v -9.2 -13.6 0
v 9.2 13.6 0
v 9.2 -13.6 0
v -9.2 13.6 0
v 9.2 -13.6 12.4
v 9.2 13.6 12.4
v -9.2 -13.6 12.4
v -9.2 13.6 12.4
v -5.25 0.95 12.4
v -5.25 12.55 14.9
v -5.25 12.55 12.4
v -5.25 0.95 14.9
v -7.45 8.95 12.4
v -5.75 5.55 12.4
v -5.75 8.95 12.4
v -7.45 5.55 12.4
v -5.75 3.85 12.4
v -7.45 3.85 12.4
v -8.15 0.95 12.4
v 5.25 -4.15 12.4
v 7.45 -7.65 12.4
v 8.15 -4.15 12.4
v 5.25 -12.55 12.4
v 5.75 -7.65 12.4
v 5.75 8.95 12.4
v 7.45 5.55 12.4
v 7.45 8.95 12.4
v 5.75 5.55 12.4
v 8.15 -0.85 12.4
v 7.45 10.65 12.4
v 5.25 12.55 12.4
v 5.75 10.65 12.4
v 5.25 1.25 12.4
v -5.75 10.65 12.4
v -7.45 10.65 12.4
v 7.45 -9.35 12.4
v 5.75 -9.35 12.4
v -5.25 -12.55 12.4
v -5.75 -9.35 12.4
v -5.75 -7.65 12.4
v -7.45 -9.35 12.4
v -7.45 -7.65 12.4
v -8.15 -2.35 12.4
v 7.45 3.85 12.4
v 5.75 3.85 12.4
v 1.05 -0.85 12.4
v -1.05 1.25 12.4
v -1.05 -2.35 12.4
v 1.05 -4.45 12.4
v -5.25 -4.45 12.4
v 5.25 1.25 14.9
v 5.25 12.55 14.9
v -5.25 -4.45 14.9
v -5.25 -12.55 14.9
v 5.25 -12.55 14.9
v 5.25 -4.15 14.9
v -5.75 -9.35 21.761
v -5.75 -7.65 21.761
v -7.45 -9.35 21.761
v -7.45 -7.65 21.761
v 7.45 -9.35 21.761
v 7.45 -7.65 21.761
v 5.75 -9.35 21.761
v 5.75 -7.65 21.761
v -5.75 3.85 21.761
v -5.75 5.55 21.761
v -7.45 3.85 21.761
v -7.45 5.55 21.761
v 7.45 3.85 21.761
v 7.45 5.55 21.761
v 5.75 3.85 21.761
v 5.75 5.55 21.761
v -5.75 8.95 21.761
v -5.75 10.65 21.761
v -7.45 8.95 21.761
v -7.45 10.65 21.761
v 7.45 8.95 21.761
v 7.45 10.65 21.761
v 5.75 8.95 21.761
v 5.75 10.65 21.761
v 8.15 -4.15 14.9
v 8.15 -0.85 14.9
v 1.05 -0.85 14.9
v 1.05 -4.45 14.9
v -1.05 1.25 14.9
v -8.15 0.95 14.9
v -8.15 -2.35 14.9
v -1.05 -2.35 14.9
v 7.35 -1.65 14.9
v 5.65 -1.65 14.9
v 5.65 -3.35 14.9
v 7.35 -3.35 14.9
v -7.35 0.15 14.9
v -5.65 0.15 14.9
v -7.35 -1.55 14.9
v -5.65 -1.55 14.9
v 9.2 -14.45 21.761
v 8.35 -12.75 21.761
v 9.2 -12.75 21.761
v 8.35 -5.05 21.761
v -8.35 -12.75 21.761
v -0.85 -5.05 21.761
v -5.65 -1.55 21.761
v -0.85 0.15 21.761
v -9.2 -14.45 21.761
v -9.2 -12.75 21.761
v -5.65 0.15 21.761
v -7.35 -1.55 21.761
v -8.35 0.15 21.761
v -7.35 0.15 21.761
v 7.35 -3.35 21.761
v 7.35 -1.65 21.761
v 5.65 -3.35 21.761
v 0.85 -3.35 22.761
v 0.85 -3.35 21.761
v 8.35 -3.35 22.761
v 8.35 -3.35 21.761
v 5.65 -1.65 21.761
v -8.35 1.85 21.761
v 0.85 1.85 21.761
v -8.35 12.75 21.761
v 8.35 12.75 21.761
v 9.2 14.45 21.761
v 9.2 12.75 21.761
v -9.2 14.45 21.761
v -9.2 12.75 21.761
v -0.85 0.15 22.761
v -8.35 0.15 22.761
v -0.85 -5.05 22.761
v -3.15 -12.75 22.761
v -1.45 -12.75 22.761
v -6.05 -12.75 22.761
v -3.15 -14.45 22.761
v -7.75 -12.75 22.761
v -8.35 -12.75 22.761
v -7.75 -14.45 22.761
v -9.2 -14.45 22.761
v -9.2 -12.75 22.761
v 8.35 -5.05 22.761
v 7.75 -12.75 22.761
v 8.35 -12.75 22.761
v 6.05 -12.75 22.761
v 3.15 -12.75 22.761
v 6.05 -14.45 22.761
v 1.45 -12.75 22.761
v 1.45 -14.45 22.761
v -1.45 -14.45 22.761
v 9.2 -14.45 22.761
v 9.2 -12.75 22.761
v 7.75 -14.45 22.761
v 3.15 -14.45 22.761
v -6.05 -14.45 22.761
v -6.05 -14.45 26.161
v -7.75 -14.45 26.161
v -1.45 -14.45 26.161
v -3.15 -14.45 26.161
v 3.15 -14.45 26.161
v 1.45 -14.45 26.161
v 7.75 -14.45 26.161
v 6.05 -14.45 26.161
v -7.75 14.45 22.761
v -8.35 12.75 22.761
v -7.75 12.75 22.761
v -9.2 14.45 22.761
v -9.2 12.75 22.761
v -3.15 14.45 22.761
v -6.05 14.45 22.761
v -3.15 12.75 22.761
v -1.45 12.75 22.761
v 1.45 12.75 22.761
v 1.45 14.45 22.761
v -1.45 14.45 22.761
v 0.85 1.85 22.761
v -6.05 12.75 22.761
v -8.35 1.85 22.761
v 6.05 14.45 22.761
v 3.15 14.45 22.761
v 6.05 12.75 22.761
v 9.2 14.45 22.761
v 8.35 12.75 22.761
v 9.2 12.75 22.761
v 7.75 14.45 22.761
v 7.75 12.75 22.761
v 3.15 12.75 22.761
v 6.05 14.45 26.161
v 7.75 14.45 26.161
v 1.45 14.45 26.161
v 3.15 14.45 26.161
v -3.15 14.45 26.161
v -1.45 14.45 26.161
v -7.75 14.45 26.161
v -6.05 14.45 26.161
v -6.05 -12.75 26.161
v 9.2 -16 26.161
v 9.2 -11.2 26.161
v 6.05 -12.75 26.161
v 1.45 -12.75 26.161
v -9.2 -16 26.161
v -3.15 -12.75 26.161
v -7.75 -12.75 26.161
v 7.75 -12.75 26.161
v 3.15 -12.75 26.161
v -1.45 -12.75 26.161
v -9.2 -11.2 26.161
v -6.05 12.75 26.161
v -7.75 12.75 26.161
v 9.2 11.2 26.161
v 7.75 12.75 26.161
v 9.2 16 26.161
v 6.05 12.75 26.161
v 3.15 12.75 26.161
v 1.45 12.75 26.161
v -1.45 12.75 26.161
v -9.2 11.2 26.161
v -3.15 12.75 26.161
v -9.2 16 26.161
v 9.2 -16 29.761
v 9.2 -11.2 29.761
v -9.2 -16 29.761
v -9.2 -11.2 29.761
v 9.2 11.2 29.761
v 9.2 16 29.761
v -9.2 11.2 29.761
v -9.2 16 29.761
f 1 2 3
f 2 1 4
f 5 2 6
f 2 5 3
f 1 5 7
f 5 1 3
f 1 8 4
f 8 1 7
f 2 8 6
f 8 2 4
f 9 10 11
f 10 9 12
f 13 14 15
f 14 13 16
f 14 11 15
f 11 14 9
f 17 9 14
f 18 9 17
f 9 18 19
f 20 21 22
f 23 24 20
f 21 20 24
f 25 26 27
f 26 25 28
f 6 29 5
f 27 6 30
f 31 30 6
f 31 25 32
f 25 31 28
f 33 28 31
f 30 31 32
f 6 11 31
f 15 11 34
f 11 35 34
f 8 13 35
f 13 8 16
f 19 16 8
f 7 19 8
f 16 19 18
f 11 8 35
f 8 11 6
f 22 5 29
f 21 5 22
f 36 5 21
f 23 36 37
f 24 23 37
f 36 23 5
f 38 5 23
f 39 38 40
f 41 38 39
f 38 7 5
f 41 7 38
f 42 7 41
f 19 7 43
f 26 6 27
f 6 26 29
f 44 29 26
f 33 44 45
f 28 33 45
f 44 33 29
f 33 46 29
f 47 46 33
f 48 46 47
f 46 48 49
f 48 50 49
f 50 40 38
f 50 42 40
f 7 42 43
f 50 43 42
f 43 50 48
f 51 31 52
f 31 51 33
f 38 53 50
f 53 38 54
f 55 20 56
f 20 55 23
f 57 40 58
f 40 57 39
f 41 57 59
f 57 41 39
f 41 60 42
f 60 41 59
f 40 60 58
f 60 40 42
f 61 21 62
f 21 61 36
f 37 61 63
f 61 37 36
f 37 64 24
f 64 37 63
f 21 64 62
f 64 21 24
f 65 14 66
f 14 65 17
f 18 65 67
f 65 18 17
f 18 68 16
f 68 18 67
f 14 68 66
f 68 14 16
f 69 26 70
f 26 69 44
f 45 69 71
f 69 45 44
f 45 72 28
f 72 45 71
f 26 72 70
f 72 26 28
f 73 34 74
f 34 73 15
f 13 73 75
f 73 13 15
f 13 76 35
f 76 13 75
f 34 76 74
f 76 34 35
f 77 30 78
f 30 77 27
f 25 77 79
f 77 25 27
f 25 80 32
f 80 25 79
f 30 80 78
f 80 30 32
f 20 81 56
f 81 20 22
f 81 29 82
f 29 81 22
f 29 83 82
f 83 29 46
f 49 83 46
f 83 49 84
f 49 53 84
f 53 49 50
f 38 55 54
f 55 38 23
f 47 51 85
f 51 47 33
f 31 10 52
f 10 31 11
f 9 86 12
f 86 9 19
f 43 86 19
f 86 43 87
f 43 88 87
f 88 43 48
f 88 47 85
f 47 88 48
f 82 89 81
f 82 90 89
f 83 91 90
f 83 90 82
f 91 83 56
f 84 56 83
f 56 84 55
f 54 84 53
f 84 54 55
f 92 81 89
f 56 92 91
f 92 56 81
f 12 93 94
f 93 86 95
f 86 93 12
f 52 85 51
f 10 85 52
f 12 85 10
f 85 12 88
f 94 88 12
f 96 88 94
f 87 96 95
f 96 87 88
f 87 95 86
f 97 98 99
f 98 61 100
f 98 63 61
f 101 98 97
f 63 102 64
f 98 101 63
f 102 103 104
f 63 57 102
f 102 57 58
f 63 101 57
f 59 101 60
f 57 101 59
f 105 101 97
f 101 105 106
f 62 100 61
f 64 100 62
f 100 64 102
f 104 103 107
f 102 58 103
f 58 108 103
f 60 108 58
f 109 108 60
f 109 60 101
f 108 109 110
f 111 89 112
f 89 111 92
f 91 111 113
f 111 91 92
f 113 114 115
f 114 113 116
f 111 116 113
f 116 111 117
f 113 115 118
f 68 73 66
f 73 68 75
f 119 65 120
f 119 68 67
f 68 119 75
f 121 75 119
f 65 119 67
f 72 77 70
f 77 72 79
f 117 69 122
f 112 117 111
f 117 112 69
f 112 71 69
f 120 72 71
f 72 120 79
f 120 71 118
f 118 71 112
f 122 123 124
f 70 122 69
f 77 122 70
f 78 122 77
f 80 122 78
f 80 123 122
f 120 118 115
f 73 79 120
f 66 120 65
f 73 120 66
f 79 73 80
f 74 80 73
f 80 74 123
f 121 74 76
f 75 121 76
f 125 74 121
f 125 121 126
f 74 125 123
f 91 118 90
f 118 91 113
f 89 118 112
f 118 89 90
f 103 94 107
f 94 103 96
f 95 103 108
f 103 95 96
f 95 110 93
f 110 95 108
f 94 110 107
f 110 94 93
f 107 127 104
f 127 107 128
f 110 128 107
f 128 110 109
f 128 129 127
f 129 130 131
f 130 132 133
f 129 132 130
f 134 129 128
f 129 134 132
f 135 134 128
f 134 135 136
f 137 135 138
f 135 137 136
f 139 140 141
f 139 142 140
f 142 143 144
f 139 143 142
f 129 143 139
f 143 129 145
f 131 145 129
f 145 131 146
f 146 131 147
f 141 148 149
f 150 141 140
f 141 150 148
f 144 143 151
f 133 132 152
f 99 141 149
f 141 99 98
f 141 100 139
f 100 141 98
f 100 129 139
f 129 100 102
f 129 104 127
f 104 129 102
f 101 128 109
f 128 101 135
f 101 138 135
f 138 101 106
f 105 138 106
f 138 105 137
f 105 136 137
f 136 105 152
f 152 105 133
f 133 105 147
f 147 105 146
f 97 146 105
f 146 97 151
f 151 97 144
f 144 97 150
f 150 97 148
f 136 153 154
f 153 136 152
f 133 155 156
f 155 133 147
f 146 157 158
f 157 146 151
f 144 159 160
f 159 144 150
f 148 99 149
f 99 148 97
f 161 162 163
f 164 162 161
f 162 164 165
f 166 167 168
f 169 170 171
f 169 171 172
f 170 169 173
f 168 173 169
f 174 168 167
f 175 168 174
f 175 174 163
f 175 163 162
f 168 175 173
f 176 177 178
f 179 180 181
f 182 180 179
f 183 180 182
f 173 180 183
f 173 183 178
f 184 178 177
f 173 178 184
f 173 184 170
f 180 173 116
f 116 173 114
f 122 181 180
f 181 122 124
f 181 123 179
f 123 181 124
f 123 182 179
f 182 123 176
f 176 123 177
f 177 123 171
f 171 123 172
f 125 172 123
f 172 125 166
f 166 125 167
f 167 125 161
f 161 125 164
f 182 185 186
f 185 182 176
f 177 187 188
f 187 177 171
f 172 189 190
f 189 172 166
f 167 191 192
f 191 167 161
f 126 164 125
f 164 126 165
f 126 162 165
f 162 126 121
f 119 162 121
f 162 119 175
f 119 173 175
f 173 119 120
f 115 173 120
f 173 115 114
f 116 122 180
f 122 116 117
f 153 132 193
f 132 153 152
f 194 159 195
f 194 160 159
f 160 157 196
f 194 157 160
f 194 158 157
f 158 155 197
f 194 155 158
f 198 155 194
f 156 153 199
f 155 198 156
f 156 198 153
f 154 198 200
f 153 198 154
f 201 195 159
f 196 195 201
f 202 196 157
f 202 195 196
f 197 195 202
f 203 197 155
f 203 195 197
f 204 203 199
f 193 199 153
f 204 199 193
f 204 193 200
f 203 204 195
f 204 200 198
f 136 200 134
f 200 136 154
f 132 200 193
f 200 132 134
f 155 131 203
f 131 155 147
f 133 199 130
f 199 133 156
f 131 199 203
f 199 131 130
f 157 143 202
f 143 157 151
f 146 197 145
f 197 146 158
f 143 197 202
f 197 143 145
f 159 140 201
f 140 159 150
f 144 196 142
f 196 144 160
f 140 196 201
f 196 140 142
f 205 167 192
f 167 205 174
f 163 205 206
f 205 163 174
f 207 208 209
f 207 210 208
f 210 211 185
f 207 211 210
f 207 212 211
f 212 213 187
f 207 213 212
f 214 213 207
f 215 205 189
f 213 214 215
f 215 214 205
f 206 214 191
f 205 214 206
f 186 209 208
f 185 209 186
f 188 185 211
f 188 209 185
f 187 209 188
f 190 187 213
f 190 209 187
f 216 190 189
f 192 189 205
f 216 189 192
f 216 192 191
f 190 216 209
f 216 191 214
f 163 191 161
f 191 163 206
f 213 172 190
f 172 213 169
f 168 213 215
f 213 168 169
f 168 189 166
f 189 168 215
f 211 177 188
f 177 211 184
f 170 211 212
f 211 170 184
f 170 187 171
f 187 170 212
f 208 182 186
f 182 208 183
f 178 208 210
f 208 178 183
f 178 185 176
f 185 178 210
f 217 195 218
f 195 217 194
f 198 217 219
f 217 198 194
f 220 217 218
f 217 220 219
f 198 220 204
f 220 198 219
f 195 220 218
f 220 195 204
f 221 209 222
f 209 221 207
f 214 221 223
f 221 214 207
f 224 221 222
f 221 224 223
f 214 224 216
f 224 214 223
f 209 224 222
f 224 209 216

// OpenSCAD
// Generated by SolidPython 0.4.2 on 2020-09-29 23:20:25
//!OpenSCAD

scale(v = 0.0100000000) {
	translate(v = [-920, -1360, 0]) {
		union() {
			color(c = [0.4000000000, 0.4000000000, 0.4000000000]) {
				translate(v = [0, 0, 0]) {
					linear_extrude(height = 1000.0000000000) {
						polygon(paths = [[0, 1, 2, 3]], points = [[0, 0], [0, 2720], [1840, 2720], [1840, 0]]);
					}
				}
			}
			color(c = [0.2000000000, 0.6000000000, 0.2000000000]) {
				translate(v = [0, 0, 1000.0000000000]) {
					linear_extrude(height = 120.0000000000) {
						polygon(paths = [[0, 1, 2, 3]], points = [[0, 1305], [0, 2720], [1840, 2720], [1840, 1305]]);
					}
				}
			}
			color(c = [0.4000000000, 0.4000000000, 0.4000000000]) {
				translate(v = [0, 0, 1000.0000000000]) {
					linear_extrude(height = 120.0000000000) {
						polygon(paths = [[0, 1, 2, 3]], points = [[0, 0], [0, 1305], [1840, 1305], [1840, 0]]);
					}
				}
			}
			color(c = [0.9000000000, 0.6000000000, 0.6000000000]) {
				translate(v = [0, 0, 1120.0000000000]) {
					linear_extrude(height = 120.0000000000) {
						polygon(paths = [[0, 1, 2, 3]], points = [[135, 1615], [135, 2485], [395, 2485], [395, 1615]]);
					}
				}
			}
			color(c = [0.9000000000, 0.6000000000, 0.6000000000]) {
				translate(v = [0, 0, 1120.0000000000]) {
					linear_extrude(height = 120.0000000000) {
						polygon(paths = [[0, 1, 2, 3]], points = [[1445, 1615], [1445, 2485], [1705, 2485], [1705, 1615]]);
					}
				}
			}
			color(c = [0.9000000000, 0.6000000000, 0.9000000000]) {
				translate(v = [0, 0, 1120.0000000000]) {
					linear_extrude(height = 120.0000000000) {
						polygon(paths = [[0, 1, 2, 3]], points = [[135, 235], [135, 785], [395, 785], [395, 235]]);
					}
				}
			}
			color(c = [0.9000000000, 0.6000000000, 0.9000000000]) {
				translate(v = [0, 0, 1120.0000000000]) {
					linear_extrude(height = 120.0000000000) {
						polygon(paths = [[0, 1, 2, 3]], points = [[1445, 235], [1445, 785], [1705, 785], [1705, 235]]);
					}
				}
			}
			color(c = [0.2000000000, 0.6000000000, 0.2000000000]) {
				translate(v = [0, 0, 1120.0000000000]) {
					linear_extrude(height = 120.0000000000) {
						difference() {
							polygon(paths = [[0, 1, 2, 3]], points = [[0, 1305], [0, 2720], [1840, 2720], [1840, 1305]]);
							polygon(paths = [[0, 1, 2, 3]], points = [[135, 1615], [395, 1615], [395, 2485], [135, 2485]]);
							polygon(paths = [[0, 1, 2, 3]], points = [[1445, 1615], [1705, 1615], [1705, 2485], [1445, 2485]]);
						}
					}
				}
			}
			color(c = [0.4000000000, 0.4000000000, 0.4000000000]) {
				translate(v = [0, 0, 1120.0000000000]) {
					linear_extrude(height = 120.0000000000) {
						difference() {
							polygon(paths = [[0, 1, 2, 3]], points = [[0, 0], [0, 1305], [1840, 1305], [1840, 0]]);
							polygon(paths = [[0, 1, 2, 3]], points = [[135, 235], [395, 235], [395, 785], [135, 785]]);
							polygon(paths = [[0, 1, 2, 3]], points = [[1445, 235], [1705, 235], [1705, 785], [1445, 785]]);
						}
					}
				}
			}
			color(c = [0.1000000000, 0.1000000000, 0.1000000000]) {
				translate(v = [0, 0, 1240.0000000000]) {
					linear_extrude(height = 70.0000000000) {
						polygon(paths = [[0, 1, 2, 3]], points = [[175, 425], [175, 595], [345, 595], [345, 425]]);
					}
				}
			}
			color(c = [0.1000000000, 0.1000000000, 0.1000000000]) {
				translate(v = [0, 0, 1240.0000000000]) {
					linear_extrude(height = 70.0000000000) {
						polygon(paths = [[0, 1, 2, 3]], points = [[1495, 425], [1495, 595], [1665, 595], [1665, 425]]);
					}
				}
			}
			color(c = [0.1000000000, 0.1000000000, 0.1000000000]) {
				translate(v = [0, 0, 1240.0000000000]) {
					linear_extrude(height = 70.0000000000) {
						polygon(paths = [[0, 1, 2, 3]], points = [[175, 1745], [175, 1915], [345, 1915], [345, 1745]]);
					}
				}
			}
			color(c = [0.1000000000, 0.1000000000, 0.1000000000]) {
				translate(v = [0, 0, 1240.0000000000]) {
					linear_extrude(height = 70.0000000000) {
						polygon(paths = [[0, 1, 2, 3]], points = [[1495, 1745], [1495, 1915], [1665, 1915], [1665, 1745]]);
					}
				}
			}
			color(c = [0.1000000000, 0.1000000000, 0.1000000000]) {
				translate(v = [0, 0, 1240.0000000000]) {
					linear_extrude(height = 70.0000000000) {
						polygon(paths = [[0, 1, 2, 3]], points = [[175, 2255], [175, 2425], [345, 2425], [345, 2255]]);
					}
				}
			}
			color(c = [0.1000000000, 0.1000000000, 0.1000000000]) {
				translate(v = [0, 0, 1240.0000000000]) {
					linear_extrude(height = 70.0000000000) {
						polygon(paths = [[0, 1, 2, 3]], points = [[1495, 2255], [1495, 2425], [1665, 2425], [1665, 2255]]);
					}
				}
			}
			color(c = [1.0000000000, 1.0000000000, 1.0000000000]) {
				translate(v = [0, 0, 1240.0000000000]) {
					linear_extrude(height = 70.0000000000) {
						polygon(paths = [[0, 1, 2, 3, 4, 5, 6, 7]], points = [[395, 105], [395, 915], [1025, 915], [1025, 1275], [1735, 1275], [1735, 945], [1445, 945], [1445, 105]]);
					}
				}
			}
			color(c = [1.0000000000, 1.0000000000, 1.0000000000]) {
				translate(v = [0, 0, 1240.0000000000]) {
					linear_extrude(height = 70.0000000000) {
						polygon(paths = [[0, 1, 2, 3, 4, 5, 6, 7]], points = [[105, 1125], [105, 1455], [395, 1455], [395, 2615], [1445, 2615], [1445, 1485], [815, 1485], [815, 1125]]);
					}
				}
			}
			color(c = [0.1000000000, 0.1000000000, 0.1000000000]) {
				translate(v = [0, 0, 1310.0000000000]) {
					linear_extrude(height = 180.0000000000) {
						polygon(paths = [[0, 1, 2, 3]], points = [[175, 425], [175, 595], [345, 595], [345, 425]]);
					}
				}
			}
			color(c = [0.1000000000, 0.1000000000, 0.1000000000]) {
				translate(v = [0, 0, 1310.0000000000]) {
					linear_extrude(height = 180.0000000000) {
						polygon(paths = [[0, 1, 2, 3]], points = [[1495, 425], [1495, 595], [1665, 595], [1665, 425]]);
					}
				}
			}
			color(c = [0.1000000000, 0.1000000000, 0.1000000000]) {
				translate(v = [0, 0, 1310.0000000000]) {
					linear_extrude(height = 180.0000000000) {
						polygon(paths = [[0, 1, 2, 3]], points = [[175, 1745], [175, 1915], [345, 1915], [345, 1745]]);
					}
				}
			}
			color(c = [0.1000000000, 0.1000000000, 0.1000000000]) {
				translate(v = [0, 0, 1310.0000000000]) {
					linear_extrude(height = 180.0000000000) {
						polygon(paths = [[0, 1, 2, 3]], points = [[1495, 1745], [1495, 1915], [1665, 1915], [1665, 1745]]);
					}
				}
			}
			color(c = [0.1000000000, 0.1000000000, 0.1000000000]) {
				translate(v = [0, 0, 1310.0000000000]) {
					linear_extrude(height = 180.0000000000) {
						polygon(paths = [[0, 1, 2, 3]], points = [[175, 2255], [175, 2425], [345, 2425], [345, 2255]]);
					}
				}
			}
			color(c = [0.1000000000, 0.1000000000, 0.1000000000]) {
				translate(v = [0, 0, 1310.0000000000]) {
					linear_extrude(height = 180.0000000000) {
						polygon(paths = [[0, 1, 2, 3]], points = [[1495, 2255], [1495, 2425], [1665, 2425], [1665, 2255]]);
					}
				}
			}
			color(c = [0.7000000000, 0, 0]) {
				translate(v = [0, 0, 1310.0000000000]) {
					linear_extrude(height = 180.0000000000) {
						polygon(paths = [[0, 1, 2, 3, 4, 5, 6, 7]], points = [[395, 105], [395, 915], [1025, 915], [1025, 1275], [1735, 1275], [1735, 945], [1445, 945], [1445, 105]]);
					}
				}
			}
			color(c = [0.7000000000, 0, 0]) {
				translate(v = [0, 0, 1310.0000000000]) {
					linear_extrude(height = 180.0000000000) {
						polygon(paths = [[0, 1, 2, 3, 4, 5, 6, 7]], points = [[105, 1125], [105, 1455], [395, 1455], [395, 2615], [1445, 2615], [1445, 1485], [815, 1485], [815, 1125]]);
					}
				}
			}
			color(c = [0.1000000000, 0.1000000000, 0.1000000000]) {
				translate(v = [0, 0, 1490.0000000000]) {
					linear_extrude(height = 686.1000000000) {
						polygon(paths = [[0, 1, 2, 3]], points = [[175, 425], [175, 595], [345, 595], [345, 425]]);
					}
				}
			}
			color(c = [0.1000000000, 0.1000000000, 0.1000000000]) {
				translate(v = [0, 0, 1490.0000000000]) {
					linear_extrude(height = 686.1000000000) {
						polygon(paths = [[0, 1, 2, 3]], points = [[1495, 425], [1495, 595], [1665, 595], [1665, 425]]);
					}
				}
			}
			color(c = [0.1000000000, 0.1000000000, 0.1000000000]) {
				translate(v = [0, 0, 1490.0000000000]) {
					linear_extrude(height = 686.1000000000) {
						polygon(paths = [[0, 1, 2, 3]], points = [[1485, 1025], [1485, 1195], [1655, 1195], [1655, 1025]]);
					}
				}
			}
			color(c = [0.1000000000, 0.1000000000, 0.1000000000]) {
				translate(v = [0, 0, 1490.0000000000]) {
					linear_extrude(height = 686.1000000000) {
						polygon(paths = [[0, 1, 2, 3]], points = [[185, 1205], [185, 1375], [355, 1375], [355, 1205]]);
					}
				}
			}
			color(c = [0.1000000000, 0.1000000000, 0.1000000000]) {
				translate(v = [0, 0, 1490.0000000000]) {
					linear_extrude(height = 686.1000000000) {
						polygon(paths = [[0, 1, 2, 3]], points = [[175, 1745], [175, 1915], [345, 1915], [345, 1745]]);
					}
				}
			}
			color(c = [0.1000000000, 0.1000000000, 0.1000000000]) {
				translate(v = [0, 0, 1490.0000000000]) {
					linear_extrude(height = 686.1000000000) {
						polygon(paths = [[0, 1, 2, 3]], points = [[1495, 1745], [1495, 1915], [1665, 1915], [1665, 1745]]);
					}
				}
			}
			color(c = [0.1000000000, 0.1000000000, 0.1000000000]) {
				translate(v = [0, 0, 1490.0000000000]) {
					linear_extrude(height = 686.1000000000) {
						polygon(paths = [[0, 1, 2, 3]], points = [[175, 2255], [175, 2425], [345, 2425], [345, 2255]]);
					}
				}
			}
			color(c = [0.1000000000, 0.1000000000, 0.1000000000]) {
				translate(v = [0, 0, 1490.0000000000]) {
					linear_extrude(height = 686.1000000000) {
						polygon(paths = [[0, 1, 2, 3]], points = [[1495, 2255], [1495, 2425], [1665, 2425], [1665, 2255]]);
					}
				}
			}
			color(c = [0.9000000000, 0.6000000000, 0.6000000000]) {
				translate(v = [0, 0, 2176.1000000000]) {
					linear_extrude(height = 100.0000000000) {
						polygon(paths = [[0, 1, 2, 3, 4, 5, 6, 7, 8, 9]], points = [[0, -85], [0, 85], [85, 85], [85, 1375], [835, 1375], [835, 855], [1755, 855], [1755, 85], [1840, 85], [1840, -85]]);
					}
				}
			}
			color(c = [0.9000000000, 0.6000000000, 0.6000000000]) {
				translate(v = [0, 0, 2176.1000000000]) {
					linear_extrude(height = 100.0000000000) {
						polygon(paths = [[0, 1, 2, 3, 4, 5, 6, 7, 8, 9]], points = [[1005, 1025], [1005, 1545], [85, 1545], [85, 2635], [0, 2635], [0, 2805], [1840, 2805], [1840, 2635], [1755, 2635], [1755, 1025]]);
					}
				}
			}
			color(c = [0.5000000000, 0.5000000000, 0.5000000000]) {
				translate(v = [0, 0, 2276.1000000000]) {
					linear_extrude(height = 340.0000000000) {
						polygon(paths = [[0, 1, 2, 3]], points = [[145, -85], [145, 85], [315, 85], [315, -85]]);
					}
				}
			}
			color(c = [0.5000000000, 0.5000000000, 0.5000000000]) {
				translate(v = [0, 0, 2276.1000000000]) {
					linear_extrude(height = 340.0000000000) {
						polygon(paths = [[0, 1, 2, 3]], points = [[605, -85], [605, 85], [775, 85], [775, -85]]);
					}
				}
			}
			color(c = [0.5000000000, 0.5000000000, 0.5000000000]) {
				translate(v = [0, 0, 2276.1000000000]) {
					linear_extrude(height = 340.0000000000) {
						polygon(paths = [[0, 1, 2, 3]], points = [[1065, -85], [1065, 85], [1235, 85], [1235, -85]]);
					}
				}
			}
			color(c = [0.5000000000, 0.5000000000, 0.5000000000]) {
				translate(v = [0, 0, 2276.1000000000]) {
					linear_extrude(height = 340.0000000000) {
						polygon(paths = [[0, 1, 2, 3]], points = [[1525, -85], [1525, 85], [1695, 85], [1695, -85]]);
					}
				}
			}
			color(c = [0.5000000000, 0.5000000000, 0.5000000000]) {
				translate(v = [0, 0, 2276.1000000000]) {
					linear_extrude(height = 340.0000000000) {
						polygon(paths = [[0, 1, 2, 3]], points = [[145, 2635], [145, 2805], [315, 2805], [315, 2635]]);
					}
				}
			}
			color(c = [0.5000000000, 0.5000000000, 0.5000000000]) {
				translate(v = [0, 0, 2276.1000000000]) {
					linear_extrude(height = 340.0000000000) {
						polygon(paths = [[0, 1, 2, 3]], points = [[605, 2635], [605, 2805], [775, 2805], [775, 2635]]);
					}
				}
			}
			color(c = [0.5000000000, 0.5000000000, 0.5000000000]) {
				translate(v = [0, 0, 2276.1000000000]) {
					linear_extrude(height = 340.0000000000) {
						polygon(paths = [[0, 1, 2, 3]], points = [[1065, 2635], [1065, 2805], [1235, 2805], [1235, 2635]]);
					}
				}
			}
			color(c = [0.5000000000, 0.5000000000, 0.5000000000]) {
				translate(v = [0, 0, 2276.1000000000]) {
					linear_extrude(height = 340.0000000000) {
						polygon(paths = [[0, 1, 2, 3]], points = [[1525, 2635], [1525, 2805], [1695, 2805], [1695, 2635]]);
					}
				}
			}
			color(c = [0.3000000000, 0.3000000000, 1]) {
				translate(v = [0, 0, 2616.1000000000]) {
					linear_extrude(height = 360.0000000000) {
						polygon(paths = [[0, 1, 2, 3]], points = [[0, -240], [0, 240], [1840, 240], [1840, -240]]);
					}
				}
			}
			color(c = [0.3000000000, 0.3000000000, 1]) {
				translate(v = [0, 0, 2616.1000000000]) {
					linear_extrude(height = 360.0000000000) {
						polygon(paths = [[0, 1, 2, 3]], points = [[0, 2480], [0, 2960], [1840, 2960], [1840, 2480]]);
					}
				}
			}
		}
	}
}
